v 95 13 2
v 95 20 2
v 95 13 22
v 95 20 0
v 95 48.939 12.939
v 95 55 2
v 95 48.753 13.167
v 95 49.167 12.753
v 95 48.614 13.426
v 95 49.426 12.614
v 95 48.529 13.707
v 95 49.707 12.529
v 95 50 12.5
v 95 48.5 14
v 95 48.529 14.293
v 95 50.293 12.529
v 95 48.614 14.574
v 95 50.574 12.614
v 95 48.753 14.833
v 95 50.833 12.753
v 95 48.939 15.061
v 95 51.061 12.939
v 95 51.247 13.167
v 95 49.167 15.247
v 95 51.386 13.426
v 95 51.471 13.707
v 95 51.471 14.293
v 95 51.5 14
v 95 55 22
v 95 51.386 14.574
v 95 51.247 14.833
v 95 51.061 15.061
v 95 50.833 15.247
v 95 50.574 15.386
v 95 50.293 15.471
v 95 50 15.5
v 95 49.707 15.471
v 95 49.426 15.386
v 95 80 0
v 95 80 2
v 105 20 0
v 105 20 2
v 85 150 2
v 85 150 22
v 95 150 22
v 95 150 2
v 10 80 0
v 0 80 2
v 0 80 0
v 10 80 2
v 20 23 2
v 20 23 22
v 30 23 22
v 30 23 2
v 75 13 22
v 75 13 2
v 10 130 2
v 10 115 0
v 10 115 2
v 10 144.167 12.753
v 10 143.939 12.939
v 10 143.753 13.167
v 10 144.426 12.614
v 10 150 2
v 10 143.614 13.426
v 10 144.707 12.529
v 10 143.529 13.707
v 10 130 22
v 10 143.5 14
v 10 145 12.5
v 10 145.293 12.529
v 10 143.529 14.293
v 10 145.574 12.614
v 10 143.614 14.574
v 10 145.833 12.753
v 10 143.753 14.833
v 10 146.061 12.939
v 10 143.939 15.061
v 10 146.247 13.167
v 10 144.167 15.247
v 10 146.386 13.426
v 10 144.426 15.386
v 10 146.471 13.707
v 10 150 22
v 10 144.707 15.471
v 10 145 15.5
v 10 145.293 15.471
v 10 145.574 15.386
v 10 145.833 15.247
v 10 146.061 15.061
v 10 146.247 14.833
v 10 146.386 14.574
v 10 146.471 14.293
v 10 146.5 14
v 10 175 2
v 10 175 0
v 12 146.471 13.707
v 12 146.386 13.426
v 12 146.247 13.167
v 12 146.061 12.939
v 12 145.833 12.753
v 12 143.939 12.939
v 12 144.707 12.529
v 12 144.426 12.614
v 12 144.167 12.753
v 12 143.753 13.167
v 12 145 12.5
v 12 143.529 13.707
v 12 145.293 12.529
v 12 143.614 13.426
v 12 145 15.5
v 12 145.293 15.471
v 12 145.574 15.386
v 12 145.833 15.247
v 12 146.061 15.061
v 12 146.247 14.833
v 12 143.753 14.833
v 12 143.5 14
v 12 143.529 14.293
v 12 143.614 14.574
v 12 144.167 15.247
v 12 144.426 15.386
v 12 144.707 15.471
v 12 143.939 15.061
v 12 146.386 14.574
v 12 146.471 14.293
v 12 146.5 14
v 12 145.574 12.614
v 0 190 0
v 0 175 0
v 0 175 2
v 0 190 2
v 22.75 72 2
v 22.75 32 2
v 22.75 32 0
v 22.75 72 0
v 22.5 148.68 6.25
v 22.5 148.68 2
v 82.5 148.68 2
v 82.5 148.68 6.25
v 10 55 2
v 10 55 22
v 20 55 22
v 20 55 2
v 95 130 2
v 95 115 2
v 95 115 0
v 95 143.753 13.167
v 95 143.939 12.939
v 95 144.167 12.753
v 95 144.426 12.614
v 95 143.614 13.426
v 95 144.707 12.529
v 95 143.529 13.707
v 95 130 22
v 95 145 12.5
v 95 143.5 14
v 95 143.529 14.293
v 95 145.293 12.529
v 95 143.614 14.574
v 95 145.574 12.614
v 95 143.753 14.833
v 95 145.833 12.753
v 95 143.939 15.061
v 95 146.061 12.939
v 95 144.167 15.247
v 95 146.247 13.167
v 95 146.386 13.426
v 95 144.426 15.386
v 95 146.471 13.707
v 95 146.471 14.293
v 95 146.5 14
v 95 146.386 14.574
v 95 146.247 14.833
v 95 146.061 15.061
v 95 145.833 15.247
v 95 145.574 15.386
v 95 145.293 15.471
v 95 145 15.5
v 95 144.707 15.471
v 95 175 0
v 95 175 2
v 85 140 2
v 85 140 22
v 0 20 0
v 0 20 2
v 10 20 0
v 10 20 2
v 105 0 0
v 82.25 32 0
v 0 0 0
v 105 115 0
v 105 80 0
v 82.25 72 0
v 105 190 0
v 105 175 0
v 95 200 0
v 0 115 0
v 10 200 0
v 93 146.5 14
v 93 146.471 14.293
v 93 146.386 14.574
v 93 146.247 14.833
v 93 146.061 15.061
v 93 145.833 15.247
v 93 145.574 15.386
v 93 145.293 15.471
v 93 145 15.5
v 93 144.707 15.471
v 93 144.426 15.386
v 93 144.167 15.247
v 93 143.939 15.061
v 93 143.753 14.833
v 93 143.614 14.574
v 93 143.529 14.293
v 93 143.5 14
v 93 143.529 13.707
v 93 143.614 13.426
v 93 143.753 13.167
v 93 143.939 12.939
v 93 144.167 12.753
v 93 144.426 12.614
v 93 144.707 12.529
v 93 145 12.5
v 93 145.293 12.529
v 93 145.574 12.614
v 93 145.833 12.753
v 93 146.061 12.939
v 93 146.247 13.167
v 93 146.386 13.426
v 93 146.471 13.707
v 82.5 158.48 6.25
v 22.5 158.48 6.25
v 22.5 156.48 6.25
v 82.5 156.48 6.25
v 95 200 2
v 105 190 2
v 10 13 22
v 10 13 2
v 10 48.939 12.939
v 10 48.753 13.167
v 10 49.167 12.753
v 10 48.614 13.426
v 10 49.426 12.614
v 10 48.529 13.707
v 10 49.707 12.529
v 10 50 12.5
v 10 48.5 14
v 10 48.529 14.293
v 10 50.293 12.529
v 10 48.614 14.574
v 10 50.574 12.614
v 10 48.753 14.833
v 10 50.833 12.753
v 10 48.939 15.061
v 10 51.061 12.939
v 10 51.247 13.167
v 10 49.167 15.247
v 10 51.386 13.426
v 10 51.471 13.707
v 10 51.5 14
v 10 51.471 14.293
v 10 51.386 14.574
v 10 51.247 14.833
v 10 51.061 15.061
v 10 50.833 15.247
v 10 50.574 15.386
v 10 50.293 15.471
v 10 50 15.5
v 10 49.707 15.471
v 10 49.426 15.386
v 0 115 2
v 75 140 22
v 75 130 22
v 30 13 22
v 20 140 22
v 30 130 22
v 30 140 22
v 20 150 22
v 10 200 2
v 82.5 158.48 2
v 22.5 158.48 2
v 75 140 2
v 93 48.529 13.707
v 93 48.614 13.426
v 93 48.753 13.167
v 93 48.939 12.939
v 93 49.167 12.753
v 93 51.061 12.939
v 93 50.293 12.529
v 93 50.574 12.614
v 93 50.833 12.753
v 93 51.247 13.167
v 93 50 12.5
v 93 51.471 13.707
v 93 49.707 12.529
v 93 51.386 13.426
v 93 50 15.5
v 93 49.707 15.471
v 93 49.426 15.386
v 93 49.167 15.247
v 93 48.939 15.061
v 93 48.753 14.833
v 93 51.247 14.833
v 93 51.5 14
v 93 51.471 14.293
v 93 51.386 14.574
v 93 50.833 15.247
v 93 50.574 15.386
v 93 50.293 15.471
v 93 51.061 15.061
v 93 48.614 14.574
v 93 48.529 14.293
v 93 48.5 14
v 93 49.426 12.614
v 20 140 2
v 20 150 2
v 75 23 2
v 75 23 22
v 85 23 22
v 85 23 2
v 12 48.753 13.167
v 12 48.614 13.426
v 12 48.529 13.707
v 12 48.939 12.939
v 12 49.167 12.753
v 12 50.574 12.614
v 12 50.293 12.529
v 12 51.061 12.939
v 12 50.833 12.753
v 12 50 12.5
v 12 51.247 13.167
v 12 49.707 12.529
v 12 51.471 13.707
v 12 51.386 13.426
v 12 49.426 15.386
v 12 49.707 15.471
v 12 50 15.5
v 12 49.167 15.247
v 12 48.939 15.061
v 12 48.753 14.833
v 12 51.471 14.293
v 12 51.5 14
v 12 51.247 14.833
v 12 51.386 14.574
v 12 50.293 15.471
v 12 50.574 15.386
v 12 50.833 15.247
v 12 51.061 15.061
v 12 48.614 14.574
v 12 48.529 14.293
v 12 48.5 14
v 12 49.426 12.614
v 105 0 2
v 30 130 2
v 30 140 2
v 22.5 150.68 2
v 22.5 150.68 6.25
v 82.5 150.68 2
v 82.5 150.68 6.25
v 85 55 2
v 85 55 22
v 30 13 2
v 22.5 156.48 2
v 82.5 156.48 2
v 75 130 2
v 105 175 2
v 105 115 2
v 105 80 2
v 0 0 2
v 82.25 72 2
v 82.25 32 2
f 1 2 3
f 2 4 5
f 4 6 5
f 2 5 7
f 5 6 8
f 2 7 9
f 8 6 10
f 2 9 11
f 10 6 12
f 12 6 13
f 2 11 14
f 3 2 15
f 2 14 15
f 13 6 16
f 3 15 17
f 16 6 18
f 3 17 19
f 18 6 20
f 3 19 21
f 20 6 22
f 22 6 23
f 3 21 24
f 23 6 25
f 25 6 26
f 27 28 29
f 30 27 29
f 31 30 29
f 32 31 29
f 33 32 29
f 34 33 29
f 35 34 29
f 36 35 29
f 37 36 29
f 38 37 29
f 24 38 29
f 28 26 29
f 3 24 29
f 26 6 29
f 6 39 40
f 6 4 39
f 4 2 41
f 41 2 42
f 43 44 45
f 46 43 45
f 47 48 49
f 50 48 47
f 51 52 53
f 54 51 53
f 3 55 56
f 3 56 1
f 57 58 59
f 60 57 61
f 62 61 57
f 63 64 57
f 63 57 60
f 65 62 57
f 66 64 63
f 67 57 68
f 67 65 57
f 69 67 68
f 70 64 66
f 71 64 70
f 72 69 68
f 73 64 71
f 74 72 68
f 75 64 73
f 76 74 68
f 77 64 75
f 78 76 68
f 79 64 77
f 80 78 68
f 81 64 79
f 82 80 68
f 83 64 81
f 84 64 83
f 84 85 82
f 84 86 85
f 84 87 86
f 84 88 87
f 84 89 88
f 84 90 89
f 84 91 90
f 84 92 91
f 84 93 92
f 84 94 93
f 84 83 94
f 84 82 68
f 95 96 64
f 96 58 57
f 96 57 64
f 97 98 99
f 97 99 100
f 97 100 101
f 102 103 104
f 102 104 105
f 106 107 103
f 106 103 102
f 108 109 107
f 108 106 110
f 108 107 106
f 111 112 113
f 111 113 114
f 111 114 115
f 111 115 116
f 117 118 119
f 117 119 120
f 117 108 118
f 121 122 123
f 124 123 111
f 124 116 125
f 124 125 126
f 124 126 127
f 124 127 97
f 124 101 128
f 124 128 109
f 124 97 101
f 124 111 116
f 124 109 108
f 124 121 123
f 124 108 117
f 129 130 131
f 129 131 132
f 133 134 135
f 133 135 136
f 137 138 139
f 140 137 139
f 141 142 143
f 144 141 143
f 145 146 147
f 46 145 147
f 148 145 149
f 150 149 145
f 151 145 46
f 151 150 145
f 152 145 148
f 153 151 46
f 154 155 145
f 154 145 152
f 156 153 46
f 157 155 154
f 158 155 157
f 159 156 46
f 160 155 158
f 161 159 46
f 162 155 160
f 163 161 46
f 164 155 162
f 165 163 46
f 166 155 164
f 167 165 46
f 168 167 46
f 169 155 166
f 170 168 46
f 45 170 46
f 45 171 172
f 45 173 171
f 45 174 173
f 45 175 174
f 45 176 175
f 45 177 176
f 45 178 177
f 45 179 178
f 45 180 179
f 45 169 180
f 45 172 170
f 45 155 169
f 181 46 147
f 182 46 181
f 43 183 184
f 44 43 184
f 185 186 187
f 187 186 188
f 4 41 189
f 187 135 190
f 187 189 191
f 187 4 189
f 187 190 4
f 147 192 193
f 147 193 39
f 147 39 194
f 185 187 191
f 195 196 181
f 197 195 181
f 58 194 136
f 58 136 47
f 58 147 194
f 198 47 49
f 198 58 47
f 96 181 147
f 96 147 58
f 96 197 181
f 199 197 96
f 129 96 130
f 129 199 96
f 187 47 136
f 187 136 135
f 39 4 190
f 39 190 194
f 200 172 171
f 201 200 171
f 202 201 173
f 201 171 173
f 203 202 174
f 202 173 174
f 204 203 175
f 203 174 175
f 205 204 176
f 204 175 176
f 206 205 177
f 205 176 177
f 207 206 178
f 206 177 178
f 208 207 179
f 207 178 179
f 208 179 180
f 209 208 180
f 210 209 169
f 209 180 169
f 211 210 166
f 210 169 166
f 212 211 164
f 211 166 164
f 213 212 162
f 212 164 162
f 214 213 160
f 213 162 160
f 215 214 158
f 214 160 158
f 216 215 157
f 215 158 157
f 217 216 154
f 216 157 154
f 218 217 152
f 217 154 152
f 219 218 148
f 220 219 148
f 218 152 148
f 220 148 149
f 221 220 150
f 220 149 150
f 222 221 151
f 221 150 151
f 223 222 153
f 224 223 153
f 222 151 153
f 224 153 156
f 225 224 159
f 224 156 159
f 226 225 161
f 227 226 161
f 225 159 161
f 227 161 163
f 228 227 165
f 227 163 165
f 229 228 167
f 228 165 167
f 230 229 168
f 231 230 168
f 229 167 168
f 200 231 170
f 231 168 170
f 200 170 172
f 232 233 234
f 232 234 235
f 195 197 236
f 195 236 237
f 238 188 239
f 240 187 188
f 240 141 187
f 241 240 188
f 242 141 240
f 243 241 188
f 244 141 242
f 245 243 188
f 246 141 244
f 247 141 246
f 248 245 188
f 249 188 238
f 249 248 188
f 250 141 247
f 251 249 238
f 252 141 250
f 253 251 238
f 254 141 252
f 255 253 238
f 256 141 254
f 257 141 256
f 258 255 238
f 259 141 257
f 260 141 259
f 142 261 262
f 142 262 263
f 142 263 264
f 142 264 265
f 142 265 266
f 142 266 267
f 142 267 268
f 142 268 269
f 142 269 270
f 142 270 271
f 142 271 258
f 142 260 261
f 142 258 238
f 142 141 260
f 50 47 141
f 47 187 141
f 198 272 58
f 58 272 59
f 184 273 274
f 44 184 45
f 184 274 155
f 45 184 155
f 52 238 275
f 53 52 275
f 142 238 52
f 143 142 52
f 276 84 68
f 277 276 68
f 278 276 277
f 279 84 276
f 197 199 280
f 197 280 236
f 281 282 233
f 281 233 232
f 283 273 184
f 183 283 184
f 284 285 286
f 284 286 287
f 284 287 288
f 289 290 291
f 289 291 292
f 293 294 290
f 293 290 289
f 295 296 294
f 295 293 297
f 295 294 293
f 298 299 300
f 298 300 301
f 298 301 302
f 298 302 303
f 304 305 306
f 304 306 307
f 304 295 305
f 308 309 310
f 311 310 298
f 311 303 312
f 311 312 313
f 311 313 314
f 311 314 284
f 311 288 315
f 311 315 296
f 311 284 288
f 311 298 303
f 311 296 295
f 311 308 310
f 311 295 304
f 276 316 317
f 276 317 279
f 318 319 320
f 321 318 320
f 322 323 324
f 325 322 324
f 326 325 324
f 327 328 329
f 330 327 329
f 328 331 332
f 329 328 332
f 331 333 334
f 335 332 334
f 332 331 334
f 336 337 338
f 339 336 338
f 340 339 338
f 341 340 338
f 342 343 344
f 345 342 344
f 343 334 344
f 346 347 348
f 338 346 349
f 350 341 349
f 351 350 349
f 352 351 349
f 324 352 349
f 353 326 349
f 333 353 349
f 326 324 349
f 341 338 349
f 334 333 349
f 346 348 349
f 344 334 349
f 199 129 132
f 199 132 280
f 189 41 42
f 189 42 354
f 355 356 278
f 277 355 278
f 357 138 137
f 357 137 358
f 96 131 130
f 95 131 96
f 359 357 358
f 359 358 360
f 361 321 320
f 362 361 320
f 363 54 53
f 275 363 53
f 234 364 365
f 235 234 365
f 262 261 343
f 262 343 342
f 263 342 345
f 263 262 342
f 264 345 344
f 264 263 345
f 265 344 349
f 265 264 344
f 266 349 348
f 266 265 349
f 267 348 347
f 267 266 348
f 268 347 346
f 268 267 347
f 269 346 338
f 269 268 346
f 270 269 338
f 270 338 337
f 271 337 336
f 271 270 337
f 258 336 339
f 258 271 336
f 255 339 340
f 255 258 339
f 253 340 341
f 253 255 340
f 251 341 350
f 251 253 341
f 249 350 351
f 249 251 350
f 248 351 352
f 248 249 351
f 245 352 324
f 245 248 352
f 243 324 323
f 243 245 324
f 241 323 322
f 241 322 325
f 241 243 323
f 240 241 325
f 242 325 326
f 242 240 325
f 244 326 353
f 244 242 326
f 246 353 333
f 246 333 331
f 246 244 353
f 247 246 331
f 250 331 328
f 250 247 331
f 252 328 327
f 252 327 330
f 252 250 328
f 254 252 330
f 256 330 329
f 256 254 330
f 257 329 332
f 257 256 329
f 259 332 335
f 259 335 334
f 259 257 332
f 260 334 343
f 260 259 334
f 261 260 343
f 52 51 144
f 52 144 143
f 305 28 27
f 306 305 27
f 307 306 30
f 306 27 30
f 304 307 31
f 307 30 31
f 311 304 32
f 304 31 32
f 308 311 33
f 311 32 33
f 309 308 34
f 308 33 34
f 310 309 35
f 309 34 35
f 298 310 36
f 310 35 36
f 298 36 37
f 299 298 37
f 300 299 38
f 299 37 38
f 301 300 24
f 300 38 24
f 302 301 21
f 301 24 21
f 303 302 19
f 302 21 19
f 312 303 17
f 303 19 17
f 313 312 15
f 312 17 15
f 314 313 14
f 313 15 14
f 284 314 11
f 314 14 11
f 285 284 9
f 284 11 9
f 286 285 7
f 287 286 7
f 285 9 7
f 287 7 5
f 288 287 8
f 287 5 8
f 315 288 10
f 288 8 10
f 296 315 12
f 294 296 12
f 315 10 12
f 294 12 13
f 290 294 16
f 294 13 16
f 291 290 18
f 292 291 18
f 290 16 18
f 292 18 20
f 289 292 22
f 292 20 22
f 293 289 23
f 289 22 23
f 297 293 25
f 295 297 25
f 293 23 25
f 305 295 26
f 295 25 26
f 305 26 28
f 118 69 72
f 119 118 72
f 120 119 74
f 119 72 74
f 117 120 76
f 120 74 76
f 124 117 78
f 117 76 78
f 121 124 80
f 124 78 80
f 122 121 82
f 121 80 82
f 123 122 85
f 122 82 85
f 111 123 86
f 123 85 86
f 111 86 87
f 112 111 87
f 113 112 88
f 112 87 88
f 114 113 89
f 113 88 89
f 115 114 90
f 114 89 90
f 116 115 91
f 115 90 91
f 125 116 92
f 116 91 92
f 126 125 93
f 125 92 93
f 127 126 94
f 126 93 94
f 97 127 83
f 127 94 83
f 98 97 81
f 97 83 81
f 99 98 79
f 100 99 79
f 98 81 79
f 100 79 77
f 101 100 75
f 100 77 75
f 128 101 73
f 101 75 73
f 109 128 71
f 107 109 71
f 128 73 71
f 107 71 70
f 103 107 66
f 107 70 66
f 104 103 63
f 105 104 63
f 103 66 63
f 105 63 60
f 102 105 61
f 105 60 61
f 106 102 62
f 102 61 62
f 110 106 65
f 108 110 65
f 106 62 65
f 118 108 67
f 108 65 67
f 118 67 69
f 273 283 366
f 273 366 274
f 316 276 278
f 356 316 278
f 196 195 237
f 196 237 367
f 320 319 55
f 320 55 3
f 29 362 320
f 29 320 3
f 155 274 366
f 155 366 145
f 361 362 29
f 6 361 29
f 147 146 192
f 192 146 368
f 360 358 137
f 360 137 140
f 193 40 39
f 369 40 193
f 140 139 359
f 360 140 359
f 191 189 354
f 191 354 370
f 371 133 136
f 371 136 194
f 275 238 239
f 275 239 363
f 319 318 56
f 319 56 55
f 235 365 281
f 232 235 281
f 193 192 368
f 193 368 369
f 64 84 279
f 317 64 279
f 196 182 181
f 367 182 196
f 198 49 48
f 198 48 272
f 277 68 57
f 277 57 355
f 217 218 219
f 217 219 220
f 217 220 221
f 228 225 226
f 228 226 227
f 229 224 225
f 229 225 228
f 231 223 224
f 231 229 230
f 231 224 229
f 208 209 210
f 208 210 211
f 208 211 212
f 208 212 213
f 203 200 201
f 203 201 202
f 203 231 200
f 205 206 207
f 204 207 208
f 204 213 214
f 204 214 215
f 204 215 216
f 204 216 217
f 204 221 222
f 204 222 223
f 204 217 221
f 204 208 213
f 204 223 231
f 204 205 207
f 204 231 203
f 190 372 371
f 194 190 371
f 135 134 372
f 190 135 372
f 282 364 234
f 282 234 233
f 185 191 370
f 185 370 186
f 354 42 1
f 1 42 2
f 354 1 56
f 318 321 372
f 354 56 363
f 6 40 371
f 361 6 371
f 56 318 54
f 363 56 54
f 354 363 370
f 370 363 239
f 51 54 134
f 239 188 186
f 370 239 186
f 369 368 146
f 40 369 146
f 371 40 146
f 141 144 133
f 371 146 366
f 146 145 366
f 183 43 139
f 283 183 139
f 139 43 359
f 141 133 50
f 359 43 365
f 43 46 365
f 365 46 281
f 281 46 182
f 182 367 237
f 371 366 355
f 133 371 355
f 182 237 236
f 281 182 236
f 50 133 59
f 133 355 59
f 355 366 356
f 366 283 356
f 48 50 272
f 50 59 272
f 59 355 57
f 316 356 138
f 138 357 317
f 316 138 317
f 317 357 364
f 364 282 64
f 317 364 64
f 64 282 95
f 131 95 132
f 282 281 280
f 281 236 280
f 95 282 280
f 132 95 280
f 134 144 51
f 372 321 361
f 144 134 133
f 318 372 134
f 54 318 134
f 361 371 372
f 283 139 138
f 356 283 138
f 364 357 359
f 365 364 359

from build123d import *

# Parameters (mm, degrees)
PAD_DEPTH       = 2
SKETCH007_W     = 10
SKETCH007_H     = 60
SKETCH007_W_2   = 59.5
SKETCH007_H_2   = 40
POCKET001_DEPTH = 2
SKETCH016_W     = 10
SKETCH016_H     = 20
PAD006_DEPTH    = 10
SKETCH014_R     = 1.5
POCKET002_DEPTH = 2
SKETCH015_R     = 1.5
POCKET003_DEPTH = 2
SKETCH036_W     = 10
SKETCH036_H     = 20
PAD018_DEPTH    = 10
SKETCH037_R     = 1.5
POCKET009_DEPTH = 2
SKETCH038_R     = 1.5
POCKET010_DEPTH = 2
SKETCH059_W     = 60
SKETCH059_H     = 2
PAD033_DEPTH    = 4.25
SKETCH063_W     = 20
SKETCH063_H     = 20
PAD037_DEPTH    = 10
SKETCH065_W     = 10
SKETCH065_H     = 20
PAD038_DEPTH    = 22
SKETCH066_W     = 20
SKETCH066_H     = 20
PAD039_DEPTH    = 10


with BuildPart() as part:
    # Sketch → Pad (new body)
    with BuildSketch(Plane.XY):
        Polygon((0, 0), (0, 190), (10, 200), (95, 200), (105, 190), (105, 0), align=None)
    extrude(amount=PAD_DEPTH)

    # Sketch007 (on Face8 of Pad) → Pocket001 (cut)
    with BuildSketch(Plane.XY.offset(2)):
        with Locations((5, 50)):
            Rectangle(SKETCH007_W, SKETCH007_H)
        with Locations((100, 50)):
            Rectangle(SKETCH007_W, SKETCH007_H)
        with Locations((5, 145)):
            Rectangle(SKETCH007_W, SKETCH007_H)
        with Locations((100, 145)):
            Rectangle(SKETCH007_W, SKETCH007_H)
        with Locations((52.5, 52)):
            Rectangle(SKETCH007_W_2, SKETCH007_H_2)
    extrude(amount=-POCKET001_DEPTH, mode=Mode.SUBTRACT)

    # Sketch016 → Pad006 (join)
    with BuildSketch(Plane.XZ.offset(-45)):
        with Locations((15, 12)):
            Rectangle(SKETCH016_W, SKETCH016_H)
        with Locations((90, 12)):
            Rectangle(SKETCH016_W, SKETCH016_H)
    extrude(amount=-PAD006_DEPTH)

    # Sketch014 → Pocket002 (cut)
    with BuildSketch(Plane.YZ.offset(10)):
        with Locations((50, 14)):
            Circle(SKETCH014_R)
    extrude(amount=POCKET002_DEPTH, mode=Mode.SUBTRACT)

    # Sketch015 → Pocket003 (cut)
    with BuildSketch(Plane.YZ.offset(95)):
        with Locations((50, 14)):
            Circle(SKETCH015_R)
    extrude(amount=-POCKET003_DEPTH, mode=Mode.SUBTRACT)

    # Sketch036 → Pad018 (join)
    with BuildSketch(Plane.XZ.offset(-140)):
        with Locations((90, 12)):
            Rectangle(SKETCH036_W, SKETCH036_H)
        with Locations((15, 12)):
            Rectangle(SKETCH036_W, SKETCH036_H)
    extrude(amount=-PAD018_DEPTH)

    # Sketch037 (on Face42 of Pad018) → Pocket009 (cut)
    with BuildSketch(Plane(origin=(10, 0, 0), x_dir=(0, -1, 0), z_dir=(-1, 0, 0))):
        with Locations((-145, 14)):
            Circle(SKETCH037_R)
    extrude(amount=-POCKET009_DEPTH, mode=Mode.SUBTRACT)

    # Sketch038 (on Face43 of Pad018) → Pocket010 (cut)
    with BuildSketch(Plane.YZ.offset(95)):
        with Locations((145, 14)):
            Circle(SKETCH038_R)
    extrude(amount=-POCKET010_DEPTH, mode=Mode.SUBTRACT)

    # Sketch059 (on Face4 of Pocket010) → Pad033 (join)
    with BuildSketch(Plane.XY.offset(2)):
        with Locations((52.5, 157.48)):
            Rectangle(SKETCH059_W, SKETCH059_H)
        with Locations((52.5, 149.68)):
            Rectangle(SKETCH059_W, SKETCH059_H)
    extrude(amount=PAD033_DEPTH)

    # Sketch063 (on Face35 of Pad033) → Pad037 (join)
    with BuildSketch(Plane.XZ.offset(-140)):
        with Locations((20, 12)):
            Rectangle(SKETCH063_W, SKETCH063_H)
        with Locations((85, 12)):
            Rectangle(SKETCH063_W, SKETCH063_H)
    extrude(amount=PAD037_DEPTH)

    # Sketch065 (on Face29 of Pad037) → Pad038 (join)
    with BuildSketch(Plane.XZ.offset(-45)):
        with Locations((15, 12)):
            Rectangle(SKETCH065_W, SKETCH065_H)
        with Locations((90, 12)):
            Rectangle(SKETCH065_W, SKETCH065_H)
    extrude(amount=PAD038_DEPTH)

    # Sketch066 (on Face29 of Pad038) → Pad039 (join)
    with BuildSketch(Plane.XZ.offset(-23)):
        with Locations((20, 12)):
            Rectangle(SKETCH066_W, SKETCH066_H)
        with Locations((85, 12)):
            Rectangle(SKETCH066_W, SKETCH066_H)
    extrude(amount=PAD039_DEPTH)


solid = part.part
